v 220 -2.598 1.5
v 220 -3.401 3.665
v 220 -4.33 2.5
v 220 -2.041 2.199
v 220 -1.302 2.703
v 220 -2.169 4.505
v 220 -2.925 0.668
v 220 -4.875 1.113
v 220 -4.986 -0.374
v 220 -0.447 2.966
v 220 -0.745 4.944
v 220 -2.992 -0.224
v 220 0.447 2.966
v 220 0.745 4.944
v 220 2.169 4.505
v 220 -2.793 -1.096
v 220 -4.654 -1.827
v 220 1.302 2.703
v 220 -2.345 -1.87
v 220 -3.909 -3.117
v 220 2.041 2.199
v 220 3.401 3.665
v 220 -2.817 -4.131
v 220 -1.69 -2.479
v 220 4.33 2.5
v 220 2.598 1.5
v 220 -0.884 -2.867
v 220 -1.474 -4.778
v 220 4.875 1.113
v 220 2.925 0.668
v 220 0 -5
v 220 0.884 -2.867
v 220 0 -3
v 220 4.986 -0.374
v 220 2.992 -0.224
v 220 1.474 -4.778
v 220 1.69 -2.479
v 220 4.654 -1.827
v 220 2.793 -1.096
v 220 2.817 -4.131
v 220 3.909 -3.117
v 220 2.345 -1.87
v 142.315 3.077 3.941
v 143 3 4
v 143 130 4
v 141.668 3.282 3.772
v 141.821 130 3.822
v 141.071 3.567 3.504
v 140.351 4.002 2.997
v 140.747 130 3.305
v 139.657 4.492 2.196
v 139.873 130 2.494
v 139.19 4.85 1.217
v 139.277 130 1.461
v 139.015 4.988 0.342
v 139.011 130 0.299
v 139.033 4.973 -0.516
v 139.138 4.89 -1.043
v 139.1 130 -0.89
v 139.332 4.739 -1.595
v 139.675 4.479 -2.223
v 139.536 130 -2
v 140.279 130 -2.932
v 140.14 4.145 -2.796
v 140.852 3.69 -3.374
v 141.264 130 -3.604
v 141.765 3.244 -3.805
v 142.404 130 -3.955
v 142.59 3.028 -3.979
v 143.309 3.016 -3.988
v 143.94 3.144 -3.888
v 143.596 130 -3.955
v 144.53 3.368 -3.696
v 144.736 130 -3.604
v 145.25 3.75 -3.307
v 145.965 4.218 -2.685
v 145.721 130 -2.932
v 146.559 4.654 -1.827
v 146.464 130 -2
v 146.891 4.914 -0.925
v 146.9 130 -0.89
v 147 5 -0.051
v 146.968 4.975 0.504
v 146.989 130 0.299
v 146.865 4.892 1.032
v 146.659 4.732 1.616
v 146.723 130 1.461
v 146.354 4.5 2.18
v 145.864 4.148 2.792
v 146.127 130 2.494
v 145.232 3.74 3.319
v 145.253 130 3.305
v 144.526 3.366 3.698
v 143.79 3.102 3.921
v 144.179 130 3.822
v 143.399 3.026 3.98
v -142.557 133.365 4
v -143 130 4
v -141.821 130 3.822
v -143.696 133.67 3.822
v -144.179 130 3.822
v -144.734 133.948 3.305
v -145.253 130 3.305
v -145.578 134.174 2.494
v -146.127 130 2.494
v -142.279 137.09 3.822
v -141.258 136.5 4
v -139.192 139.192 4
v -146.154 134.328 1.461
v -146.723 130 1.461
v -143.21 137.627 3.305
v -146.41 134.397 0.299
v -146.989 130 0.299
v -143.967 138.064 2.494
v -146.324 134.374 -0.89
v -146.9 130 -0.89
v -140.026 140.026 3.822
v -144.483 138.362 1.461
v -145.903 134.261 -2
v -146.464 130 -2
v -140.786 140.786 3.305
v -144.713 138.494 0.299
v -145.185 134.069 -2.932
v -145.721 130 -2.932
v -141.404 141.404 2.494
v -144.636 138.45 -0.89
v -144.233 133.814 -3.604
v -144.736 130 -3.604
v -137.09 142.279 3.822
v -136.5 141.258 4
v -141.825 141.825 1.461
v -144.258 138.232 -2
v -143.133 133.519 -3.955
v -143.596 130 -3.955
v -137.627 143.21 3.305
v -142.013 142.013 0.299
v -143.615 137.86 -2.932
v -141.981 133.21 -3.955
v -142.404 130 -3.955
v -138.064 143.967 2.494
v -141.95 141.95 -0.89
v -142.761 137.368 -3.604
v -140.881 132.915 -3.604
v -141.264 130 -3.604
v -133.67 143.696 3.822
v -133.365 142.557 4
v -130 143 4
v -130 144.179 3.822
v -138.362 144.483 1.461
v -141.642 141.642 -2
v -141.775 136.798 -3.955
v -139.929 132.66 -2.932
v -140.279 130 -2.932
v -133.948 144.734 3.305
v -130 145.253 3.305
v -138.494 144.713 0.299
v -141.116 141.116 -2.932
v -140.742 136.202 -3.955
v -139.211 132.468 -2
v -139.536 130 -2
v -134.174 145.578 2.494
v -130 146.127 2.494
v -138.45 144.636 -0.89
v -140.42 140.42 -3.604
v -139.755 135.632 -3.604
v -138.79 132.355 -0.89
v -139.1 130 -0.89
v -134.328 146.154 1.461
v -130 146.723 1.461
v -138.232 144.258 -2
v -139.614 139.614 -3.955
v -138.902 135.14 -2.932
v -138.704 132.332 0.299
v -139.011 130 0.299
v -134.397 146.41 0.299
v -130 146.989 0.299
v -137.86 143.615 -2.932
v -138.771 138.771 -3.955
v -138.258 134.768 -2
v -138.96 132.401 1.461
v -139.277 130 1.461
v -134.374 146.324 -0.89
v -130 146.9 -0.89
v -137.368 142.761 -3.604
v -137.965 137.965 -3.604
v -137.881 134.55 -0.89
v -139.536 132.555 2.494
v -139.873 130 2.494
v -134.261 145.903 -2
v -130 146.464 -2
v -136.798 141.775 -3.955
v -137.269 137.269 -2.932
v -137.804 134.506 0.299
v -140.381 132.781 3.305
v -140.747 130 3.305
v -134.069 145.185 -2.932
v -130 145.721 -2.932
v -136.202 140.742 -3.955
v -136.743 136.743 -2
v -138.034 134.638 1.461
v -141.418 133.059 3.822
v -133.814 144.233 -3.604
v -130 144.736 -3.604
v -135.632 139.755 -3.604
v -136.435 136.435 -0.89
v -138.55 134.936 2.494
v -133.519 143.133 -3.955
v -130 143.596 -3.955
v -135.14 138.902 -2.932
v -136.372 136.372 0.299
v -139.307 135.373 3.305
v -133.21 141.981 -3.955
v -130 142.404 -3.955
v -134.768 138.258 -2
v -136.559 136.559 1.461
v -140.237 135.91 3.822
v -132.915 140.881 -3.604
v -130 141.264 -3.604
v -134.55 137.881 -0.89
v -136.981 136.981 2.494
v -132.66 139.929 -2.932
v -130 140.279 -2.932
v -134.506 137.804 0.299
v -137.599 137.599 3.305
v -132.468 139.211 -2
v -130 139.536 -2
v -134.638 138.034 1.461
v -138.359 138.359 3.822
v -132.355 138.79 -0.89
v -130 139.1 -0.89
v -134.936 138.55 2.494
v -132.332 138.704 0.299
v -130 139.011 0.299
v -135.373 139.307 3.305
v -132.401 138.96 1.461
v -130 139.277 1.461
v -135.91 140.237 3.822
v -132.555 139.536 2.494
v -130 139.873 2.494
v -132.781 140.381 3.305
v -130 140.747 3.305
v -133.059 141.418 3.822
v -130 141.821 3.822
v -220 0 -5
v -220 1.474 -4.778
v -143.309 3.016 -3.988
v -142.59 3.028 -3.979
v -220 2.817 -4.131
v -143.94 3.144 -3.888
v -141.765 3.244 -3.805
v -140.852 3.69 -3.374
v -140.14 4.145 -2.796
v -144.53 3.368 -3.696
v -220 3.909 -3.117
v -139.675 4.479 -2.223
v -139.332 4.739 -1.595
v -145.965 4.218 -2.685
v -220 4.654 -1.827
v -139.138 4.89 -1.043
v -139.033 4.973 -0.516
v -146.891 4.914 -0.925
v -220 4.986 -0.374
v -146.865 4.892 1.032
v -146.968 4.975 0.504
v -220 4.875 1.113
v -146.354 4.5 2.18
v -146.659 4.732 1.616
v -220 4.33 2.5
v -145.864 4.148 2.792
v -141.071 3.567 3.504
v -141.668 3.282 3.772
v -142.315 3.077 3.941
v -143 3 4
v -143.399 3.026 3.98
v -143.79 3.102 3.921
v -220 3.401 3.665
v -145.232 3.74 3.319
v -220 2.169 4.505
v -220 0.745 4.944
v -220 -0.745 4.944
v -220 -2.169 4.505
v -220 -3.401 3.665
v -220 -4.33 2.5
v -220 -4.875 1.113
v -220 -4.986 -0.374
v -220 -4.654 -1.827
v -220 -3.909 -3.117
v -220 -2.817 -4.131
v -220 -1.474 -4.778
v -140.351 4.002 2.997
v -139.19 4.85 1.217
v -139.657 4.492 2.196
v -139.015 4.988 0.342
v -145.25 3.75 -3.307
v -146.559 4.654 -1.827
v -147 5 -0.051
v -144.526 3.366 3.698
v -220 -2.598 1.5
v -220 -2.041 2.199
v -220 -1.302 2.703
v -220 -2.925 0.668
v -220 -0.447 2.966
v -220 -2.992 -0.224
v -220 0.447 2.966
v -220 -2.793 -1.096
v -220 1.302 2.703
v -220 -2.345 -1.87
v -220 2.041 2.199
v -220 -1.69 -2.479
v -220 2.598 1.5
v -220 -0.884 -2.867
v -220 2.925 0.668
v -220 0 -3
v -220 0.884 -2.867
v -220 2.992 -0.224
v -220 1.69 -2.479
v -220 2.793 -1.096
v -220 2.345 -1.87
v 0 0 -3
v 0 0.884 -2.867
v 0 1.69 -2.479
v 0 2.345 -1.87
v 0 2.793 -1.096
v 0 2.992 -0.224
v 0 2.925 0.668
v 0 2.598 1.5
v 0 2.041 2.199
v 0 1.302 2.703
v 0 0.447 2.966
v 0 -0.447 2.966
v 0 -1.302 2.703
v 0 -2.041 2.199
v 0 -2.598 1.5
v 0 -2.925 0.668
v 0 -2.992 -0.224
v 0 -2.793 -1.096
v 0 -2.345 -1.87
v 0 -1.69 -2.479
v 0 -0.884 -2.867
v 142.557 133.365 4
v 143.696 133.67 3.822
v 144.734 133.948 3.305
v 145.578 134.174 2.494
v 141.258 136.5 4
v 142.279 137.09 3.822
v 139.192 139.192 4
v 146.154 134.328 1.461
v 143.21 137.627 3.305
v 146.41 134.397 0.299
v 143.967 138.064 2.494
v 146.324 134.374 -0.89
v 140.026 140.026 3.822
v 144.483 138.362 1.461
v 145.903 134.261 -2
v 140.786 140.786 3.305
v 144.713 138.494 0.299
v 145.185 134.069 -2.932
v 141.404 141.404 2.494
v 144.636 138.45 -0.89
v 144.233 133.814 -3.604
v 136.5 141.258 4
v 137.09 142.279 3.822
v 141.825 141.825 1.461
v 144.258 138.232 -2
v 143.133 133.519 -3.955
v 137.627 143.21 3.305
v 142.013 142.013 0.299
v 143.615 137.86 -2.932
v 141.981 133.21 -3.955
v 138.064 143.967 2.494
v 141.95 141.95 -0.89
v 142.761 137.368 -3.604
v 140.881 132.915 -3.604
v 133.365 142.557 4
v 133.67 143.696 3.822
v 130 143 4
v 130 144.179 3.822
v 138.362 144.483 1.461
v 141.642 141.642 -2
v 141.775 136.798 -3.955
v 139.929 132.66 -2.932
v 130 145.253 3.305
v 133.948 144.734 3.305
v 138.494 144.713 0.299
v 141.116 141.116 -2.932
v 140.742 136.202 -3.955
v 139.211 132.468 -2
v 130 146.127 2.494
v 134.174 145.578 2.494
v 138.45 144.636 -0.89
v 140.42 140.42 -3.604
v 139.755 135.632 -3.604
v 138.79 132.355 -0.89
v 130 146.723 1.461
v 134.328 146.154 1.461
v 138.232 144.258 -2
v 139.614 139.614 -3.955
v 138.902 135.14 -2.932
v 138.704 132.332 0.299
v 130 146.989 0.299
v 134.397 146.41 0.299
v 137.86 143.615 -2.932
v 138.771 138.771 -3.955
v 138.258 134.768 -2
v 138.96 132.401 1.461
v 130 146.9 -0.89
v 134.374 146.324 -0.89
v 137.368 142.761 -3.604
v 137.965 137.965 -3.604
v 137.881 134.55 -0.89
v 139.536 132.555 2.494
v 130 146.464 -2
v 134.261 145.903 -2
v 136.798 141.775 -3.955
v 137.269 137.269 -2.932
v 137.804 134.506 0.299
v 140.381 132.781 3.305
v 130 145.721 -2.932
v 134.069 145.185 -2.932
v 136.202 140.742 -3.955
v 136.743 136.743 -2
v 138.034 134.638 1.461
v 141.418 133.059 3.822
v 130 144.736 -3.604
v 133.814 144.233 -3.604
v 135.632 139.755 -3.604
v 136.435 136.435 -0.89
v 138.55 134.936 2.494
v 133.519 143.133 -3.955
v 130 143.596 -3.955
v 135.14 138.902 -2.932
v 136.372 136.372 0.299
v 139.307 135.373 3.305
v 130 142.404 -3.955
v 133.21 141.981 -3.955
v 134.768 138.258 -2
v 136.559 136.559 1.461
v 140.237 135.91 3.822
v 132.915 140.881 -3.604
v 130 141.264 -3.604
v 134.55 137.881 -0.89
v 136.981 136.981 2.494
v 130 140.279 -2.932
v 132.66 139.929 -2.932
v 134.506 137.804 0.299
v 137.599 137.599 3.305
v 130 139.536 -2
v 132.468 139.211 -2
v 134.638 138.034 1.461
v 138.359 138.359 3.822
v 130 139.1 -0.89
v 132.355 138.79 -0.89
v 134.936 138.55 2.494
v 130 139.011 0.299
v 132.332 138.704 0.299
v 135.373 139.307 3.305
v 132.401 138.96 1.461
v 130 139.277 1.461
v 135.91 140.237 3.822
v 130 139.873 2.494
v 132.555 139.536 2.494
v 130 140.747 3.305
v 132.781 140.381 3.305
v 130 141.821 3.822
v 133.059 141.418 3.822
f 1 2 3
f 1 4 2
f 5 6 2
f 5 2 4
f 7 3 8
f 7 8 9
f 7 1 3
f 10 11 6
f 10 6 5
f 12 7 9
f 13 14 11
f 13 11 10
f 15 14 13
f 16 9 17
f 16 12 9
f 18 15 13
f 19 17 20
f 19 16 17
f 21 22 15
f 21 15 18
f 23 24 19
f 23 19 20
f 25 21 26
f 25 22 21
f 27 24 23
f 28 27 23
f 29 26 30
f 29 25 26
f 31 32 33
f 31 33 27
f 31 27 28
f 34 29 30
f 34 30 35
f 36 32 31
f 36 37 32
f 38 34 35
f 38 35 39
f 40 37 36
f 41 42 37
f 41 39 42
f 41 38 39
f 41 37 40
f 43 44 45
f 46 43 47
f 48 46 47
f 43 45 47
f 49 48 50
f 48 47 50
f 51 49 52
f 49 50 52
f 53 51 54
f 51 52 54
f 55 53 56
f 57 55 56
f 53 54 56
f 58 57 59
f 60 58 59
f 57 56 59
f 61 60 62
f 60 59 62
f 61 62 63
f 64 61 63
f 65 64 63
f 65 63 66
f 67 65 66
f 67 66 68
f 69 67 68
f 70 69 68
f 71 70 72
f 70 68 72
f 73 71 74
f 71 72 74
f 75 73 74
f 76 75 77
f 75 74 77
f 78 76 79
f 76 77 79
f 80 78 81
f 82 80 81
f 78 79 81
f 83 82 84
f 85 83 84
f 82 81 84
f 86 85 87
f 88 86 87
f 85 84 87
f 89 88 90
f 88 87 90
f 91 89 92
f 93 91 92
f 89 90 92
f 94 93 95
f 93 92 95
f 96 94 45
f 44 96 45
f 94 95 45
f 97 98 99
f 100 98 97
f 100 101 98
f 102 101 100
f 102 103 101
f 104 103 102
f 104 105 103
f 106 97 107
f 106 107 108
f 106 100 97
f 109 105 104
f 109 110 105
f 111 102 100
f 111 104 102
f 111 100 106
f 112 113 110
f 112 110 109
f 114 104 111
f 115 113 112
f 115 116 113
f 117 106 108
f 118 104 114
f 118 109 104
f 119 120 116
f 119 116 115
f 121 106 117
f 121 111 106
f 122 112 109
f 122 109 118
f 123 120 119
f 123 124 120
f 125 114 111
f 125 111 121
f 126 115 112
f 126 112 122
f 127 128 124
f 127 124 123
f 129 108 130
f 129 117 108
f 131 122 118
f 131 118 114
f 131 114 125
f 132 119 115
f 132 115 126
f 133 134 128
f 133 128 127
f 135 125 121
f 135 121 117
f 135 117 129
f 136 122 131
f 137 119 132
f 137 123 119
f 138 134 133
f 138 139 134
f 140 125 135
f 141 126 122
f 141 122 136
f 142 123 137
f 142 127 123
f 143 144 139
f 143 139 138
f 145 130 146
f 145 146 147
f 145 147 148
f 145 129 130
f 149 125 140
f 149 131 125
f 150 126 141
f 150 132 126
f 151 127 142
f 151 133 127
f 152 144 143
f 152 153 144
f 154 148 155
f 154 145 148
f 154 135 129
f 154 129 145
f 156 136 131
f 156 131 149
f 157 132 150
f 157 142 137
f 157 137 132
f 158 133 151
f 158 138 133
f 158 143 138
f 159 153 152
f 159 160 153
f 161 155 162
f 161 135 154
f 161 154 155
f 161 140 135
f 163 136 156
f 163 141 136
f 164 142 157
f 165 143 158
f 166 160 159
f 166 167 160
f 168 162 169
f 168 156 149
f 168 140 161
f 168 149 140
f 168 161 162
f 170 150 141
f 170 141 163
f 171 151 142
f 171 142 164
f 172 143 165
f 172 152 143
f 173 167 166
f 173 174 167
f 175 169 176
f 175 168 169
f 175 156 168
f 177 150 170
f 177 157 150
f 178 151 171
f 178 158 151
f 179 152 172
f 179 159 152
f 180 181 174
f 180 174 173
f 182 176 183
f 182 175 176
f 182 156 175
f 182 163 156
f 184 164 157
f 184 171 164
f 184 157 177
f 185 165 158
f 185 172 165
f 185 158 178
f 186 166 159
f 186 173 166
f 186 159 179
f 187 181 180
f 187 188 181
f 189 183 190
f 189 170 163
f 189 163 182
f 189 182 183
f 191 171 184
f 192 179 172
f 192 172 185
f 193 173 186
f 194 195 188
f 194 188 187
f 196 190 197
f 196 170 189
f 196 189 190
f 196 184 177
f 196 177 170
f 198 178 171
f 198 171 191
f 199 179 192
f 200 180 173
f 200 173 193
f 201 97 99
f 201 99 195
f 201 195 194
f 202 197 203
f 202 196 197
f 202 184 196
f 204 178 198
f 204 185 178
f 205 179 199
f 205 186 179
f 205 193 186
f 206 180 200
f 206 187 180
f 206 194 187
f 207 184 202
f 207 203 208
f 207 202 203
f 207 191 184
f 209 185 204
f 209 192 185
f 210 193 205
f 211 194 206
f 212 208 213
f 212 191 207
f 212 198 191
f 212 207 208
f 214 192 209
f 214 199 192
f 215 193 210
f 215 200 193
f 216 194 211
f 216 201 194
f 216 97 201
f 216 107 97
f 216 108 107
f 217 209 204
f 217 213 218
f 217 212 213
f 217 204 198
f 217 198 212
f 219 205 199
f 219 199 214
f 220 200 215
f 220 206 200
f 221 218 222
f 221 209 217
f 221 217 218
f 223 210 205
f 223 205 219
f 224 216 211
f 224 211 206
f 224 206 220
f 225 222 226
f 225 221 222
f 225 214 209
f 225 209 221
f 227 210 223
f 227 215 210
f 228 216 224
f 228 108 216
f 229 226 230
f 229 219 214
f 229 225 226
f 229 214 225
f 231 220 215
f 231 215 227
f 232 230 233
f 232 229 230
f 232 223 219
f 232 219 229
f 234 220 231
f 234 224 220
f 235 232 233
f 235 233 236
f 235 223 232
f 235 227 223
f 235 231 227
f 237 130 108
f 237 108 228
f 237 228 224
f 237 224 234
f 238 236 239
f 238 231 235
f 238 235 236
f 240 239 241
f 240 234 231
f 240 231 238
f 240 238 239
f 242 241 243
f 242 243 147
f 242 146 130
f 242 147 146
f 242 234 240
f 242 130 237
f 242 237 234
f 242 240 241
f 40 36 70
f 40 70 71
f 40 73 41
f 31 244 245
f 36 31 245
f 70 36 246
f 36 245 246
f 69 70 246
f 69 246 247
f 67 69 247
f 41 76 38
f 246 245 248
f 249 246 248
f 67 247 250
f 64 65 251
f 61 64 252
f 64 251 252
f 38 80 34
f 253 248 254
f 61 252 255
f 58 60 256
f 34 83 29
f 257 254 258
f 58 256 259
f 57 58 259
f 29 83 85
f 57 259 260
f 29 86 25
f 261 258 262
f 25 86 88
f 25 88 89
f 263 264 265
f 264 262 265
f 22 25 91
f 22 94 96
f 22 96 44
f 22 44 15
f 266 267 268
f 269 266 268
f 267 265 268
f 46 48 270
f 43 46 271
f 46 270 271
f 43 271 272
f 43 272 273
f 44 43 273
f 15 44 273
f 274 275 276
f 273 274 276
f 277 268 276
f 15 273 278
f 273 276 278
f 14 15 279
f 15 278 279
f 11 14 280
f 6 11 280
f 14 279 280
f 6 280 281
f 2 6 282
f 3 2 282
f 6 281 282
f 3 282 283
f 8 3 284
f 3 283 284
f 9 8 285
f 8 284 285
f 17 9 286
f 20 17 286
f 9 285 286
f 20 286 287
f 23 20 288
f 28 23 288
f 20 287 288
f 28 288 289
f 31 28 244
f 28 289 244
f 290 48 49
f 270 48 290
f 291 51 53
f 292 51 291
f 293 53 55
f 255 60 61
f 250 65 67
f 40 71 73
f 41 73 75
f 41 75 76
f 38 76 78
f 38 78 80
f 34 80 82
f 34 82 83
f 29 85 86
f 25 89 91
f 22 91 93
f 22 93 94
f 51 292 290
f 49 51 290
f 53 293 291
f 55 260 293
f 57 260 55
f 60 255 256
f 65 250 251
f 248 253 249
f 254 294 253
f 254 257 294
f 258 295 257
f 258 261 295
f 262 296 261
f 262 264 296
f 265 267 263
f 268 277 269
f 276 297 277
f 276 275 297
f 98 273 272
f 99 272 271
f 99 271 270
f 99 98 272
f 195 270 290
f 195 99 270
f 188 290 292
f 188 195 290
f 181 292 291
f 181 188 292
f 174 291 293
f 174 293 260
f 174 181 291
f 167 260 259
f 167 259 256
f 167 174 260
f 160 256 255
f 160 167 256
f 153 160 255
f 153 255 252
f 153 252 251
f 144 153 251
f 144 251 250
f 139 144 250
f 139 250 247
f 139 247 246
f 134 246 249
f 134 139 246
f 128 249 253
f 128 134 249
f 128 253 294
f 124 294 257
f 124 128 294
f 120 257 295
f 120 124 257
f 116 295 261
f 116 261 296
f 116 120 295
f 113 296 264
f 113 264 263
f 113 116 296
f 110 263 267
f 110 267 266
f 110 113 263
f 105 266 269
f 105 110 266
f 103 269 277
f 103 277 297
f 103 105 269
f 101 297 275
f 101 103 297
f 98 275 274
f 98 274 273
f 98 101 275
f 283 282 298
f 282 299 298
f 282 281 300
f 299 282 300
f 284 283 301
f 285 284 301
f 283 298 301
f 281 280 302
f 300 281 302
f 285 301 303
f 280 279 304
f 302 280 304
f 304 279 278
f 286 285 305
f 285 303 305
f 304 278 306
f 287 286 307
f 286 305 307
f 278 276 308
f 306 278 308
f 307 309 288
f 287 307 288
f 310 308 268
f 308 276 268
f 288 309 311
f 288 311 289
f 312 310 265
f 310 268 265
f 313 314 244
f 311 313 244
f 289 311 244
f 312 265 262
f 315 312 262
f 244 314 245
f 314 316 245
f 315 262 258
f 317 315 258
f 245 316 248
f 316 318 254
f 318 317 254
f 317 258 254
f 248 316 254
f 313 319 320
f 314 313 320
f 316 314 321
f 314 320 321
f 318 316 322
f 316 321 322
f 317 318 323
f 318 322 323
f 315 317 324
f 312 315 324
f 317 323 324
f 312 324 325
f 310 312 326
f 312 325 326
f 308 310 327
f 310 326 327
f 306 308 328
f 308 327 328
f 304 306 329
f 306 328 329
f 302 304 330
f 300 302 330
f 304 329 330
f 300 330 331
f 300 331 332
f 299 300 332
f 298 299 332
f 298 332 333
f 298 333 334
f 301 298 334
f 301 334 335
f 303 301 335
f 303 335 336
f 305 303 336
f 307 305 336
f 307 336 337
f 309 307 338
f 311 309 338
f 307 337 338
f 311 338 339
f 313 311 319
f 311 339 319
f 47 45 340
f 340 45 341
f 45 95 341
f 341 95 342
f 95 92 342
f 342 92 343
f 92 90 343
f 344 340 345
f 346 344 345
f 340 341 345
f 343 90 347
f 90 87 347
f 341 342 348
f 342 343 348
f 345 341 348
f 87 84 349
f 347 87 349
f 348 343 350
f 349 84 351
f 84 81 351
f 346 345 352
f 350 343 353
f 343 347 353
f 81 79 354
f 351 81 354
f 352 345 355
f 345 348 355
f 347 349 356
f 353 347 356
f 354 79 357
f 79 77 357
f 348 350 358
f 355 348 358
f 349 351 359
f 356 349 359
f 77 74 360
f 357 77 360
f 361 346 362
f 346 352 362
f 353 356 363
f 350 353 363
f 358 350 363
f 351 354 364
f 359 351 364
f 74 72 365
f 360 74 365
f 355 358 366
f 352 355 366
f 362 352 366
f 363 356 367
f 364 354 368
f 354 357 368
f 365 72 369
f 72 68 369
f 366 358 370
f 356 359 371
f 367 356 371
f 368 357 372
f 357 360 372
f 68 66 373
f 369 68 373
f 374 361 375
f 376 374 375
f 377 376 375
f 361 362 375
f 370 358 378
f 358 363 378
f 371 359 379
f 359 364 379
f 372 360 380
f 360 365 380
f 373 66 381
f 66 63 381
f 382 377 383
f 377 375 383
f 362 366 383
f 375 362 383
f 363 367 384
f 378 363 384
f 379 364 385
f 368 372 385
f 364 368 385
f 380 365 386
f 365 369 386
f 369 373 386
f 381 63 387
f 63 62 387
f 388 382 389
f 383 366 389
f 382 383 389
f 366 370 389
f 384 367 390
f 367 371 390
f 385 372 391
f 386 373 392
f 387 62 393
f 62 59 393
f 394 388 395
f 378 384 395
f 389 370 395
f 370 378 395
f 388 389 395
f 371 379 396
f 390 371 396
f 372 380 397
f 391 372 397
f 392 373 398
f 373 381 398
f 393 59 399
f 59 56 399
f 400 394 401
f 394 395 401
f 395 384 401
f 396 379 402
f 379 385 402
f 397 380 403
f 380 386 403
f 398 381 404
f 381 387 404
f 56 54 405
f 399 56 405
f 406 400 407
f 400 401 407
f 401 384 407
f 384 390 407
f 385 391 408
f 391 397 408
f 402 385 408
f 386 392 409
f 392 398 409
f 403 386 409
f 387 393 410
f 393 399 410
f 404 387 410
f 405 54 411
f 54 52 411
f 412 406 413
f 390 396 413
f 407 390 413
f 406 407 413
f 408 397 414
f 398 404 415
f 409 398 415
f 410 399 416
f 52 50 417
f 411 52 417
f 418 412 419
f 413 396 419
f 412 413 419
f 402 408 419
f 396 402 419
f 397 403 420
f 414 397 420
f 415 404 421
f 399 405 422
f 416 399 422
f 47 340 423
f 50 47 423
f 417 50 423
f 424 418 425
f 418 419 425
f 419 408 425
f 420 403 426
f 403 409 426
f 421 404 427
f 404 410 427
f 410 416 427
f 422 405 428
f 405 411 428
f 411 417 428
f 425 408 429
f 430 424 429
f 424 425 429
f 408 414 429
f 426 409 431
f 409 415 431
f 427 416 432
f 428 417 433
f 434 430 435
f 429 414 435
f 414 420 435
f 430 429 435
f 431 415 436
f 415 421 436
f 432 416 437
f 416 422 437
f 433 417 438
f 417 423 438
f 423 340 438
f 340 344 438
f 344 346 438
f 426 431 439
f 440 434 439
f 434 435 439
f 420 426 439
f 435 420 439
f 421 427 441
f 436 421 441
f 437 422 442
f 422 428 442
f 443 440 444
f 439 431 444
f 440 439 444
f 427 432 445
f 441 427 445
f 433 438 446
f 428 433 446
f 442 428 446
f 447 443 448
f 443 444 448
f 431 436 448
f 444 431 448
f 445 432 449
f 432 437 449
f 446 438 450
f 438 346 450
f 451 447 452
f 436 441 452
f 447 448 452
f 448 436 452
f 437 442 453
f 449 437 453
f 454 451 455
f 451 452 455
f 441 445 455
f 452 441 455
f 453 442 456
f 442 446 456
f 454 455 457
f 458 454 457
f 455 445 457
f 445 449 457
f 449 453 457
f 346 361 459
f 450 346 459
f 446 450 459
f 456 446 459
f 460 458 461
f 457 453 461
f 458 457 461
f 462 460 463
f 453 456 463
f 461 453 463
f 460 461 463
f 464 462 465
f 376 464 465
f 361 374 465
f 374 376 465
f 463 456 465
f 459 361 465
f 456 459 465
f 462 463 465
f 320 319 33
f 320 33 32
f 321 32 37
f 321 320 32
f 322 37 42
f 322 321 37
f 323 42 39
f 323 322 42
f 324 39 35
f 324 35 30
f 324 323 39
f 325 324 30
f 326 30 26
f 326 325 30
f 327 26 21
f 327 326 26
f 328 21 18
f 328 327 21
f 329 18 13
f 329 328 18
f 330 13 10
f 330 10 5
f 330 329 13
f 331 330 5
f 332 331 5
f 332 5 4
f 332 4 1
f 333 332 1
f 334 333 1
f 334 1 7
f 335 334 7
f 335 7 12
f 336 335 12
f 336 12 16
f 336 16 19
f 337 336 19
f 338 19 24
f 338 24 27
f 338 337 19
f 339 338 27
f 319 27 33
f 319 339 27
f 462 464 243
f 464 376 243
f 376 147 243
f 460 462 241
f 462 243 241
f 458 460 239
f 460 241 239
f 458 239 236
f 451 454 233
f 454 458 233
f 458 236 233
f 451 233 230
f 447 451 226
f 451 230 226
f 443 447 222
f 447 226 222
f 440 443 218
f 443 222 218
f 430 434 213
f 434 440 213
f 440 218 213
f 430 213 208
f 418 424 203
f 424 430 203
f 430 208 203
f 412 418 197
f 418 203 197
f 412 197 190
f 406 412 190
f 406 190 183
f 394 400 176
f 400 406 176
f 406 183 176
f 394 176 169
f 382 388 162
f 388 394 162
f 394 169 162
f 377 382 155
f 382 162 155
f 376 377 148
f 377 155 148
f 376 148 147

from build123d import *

# Parameters (mm, degrees)
SKETCH1_R           = 5
BOSS_EXTRUDE1_DEPTH = 220
SWEEP1_PROFILE_R    = 4
SKETCH9_R           = 3
CUT_EXTRUDE1_DEPTH  = 220


with BuildPart() as part:
    # Sketch1 → Boss-Extrude1 (new body)
    with BuildSketch(Plane(origin=(0, 0, 0), x_dir=(0, 0, -1), z_dir=(1, 0, 0))):
        Circle(SKETCH1_R)
    boss_extrude1 = extrude(amount=-BOSS_EXTRUDE1_DEPTH)

    # Sweep1: sweep along a path in Sketch2
    with BuildLine(Plane.XY) as sweep1_path:
        Line((-143, 0), (-143, 130))
        ThreePointArc((-143, 130), (-139.192388155, 139.192388155), (-130, 143))
        Line((-130, 143), (0, 143))
    # Sweep1 profile (on start of the path) → Sweep1 (sweep)
    with BuildSketch(Plane(origin=(-143, 0, 0), x_dir=(0, 0, 1), z_dir=(0, 1, 0))):
        Circle(SWEEP1_PROFILE_R)
    sweep1 = sweep(path=sweep1_path.line)

    # Sketch9 → Cut-Extrude1 (cut)
    with BuildSketch(Plane(origin=(0, 0, 0), x_dir=(0, 0, -1), z_dir=(1, 0, 0))):
        Circle(SKETCH9_R)
    cut_extrude1 = extrude(amount=-CUT_EXTRUDE1_DEPTH, mode=Mode.SUBTRACT)

    # Mirror1: Boss-Extrude1, Sweep1, Cut-Extrude1 across plane
    add(boss_extrude1.mirror(Plane(origin=(0, 0, 0), x_dir=(0, 0, 1), z_dir=(1, 0, 0))))
    add(sweep1.mirror(Plane(origin=(0, 0, 0), x_dir=(0, 0, 1), z_dir=(1, 0, 0))))
    add(cut_extrude1.mirror(Plane(origin=(0, 0, 0), x_dir=(0, 0, 1), z_dir=(1, 0, 0))), mode=Mode.SUBTRACT)


solid = part.part
